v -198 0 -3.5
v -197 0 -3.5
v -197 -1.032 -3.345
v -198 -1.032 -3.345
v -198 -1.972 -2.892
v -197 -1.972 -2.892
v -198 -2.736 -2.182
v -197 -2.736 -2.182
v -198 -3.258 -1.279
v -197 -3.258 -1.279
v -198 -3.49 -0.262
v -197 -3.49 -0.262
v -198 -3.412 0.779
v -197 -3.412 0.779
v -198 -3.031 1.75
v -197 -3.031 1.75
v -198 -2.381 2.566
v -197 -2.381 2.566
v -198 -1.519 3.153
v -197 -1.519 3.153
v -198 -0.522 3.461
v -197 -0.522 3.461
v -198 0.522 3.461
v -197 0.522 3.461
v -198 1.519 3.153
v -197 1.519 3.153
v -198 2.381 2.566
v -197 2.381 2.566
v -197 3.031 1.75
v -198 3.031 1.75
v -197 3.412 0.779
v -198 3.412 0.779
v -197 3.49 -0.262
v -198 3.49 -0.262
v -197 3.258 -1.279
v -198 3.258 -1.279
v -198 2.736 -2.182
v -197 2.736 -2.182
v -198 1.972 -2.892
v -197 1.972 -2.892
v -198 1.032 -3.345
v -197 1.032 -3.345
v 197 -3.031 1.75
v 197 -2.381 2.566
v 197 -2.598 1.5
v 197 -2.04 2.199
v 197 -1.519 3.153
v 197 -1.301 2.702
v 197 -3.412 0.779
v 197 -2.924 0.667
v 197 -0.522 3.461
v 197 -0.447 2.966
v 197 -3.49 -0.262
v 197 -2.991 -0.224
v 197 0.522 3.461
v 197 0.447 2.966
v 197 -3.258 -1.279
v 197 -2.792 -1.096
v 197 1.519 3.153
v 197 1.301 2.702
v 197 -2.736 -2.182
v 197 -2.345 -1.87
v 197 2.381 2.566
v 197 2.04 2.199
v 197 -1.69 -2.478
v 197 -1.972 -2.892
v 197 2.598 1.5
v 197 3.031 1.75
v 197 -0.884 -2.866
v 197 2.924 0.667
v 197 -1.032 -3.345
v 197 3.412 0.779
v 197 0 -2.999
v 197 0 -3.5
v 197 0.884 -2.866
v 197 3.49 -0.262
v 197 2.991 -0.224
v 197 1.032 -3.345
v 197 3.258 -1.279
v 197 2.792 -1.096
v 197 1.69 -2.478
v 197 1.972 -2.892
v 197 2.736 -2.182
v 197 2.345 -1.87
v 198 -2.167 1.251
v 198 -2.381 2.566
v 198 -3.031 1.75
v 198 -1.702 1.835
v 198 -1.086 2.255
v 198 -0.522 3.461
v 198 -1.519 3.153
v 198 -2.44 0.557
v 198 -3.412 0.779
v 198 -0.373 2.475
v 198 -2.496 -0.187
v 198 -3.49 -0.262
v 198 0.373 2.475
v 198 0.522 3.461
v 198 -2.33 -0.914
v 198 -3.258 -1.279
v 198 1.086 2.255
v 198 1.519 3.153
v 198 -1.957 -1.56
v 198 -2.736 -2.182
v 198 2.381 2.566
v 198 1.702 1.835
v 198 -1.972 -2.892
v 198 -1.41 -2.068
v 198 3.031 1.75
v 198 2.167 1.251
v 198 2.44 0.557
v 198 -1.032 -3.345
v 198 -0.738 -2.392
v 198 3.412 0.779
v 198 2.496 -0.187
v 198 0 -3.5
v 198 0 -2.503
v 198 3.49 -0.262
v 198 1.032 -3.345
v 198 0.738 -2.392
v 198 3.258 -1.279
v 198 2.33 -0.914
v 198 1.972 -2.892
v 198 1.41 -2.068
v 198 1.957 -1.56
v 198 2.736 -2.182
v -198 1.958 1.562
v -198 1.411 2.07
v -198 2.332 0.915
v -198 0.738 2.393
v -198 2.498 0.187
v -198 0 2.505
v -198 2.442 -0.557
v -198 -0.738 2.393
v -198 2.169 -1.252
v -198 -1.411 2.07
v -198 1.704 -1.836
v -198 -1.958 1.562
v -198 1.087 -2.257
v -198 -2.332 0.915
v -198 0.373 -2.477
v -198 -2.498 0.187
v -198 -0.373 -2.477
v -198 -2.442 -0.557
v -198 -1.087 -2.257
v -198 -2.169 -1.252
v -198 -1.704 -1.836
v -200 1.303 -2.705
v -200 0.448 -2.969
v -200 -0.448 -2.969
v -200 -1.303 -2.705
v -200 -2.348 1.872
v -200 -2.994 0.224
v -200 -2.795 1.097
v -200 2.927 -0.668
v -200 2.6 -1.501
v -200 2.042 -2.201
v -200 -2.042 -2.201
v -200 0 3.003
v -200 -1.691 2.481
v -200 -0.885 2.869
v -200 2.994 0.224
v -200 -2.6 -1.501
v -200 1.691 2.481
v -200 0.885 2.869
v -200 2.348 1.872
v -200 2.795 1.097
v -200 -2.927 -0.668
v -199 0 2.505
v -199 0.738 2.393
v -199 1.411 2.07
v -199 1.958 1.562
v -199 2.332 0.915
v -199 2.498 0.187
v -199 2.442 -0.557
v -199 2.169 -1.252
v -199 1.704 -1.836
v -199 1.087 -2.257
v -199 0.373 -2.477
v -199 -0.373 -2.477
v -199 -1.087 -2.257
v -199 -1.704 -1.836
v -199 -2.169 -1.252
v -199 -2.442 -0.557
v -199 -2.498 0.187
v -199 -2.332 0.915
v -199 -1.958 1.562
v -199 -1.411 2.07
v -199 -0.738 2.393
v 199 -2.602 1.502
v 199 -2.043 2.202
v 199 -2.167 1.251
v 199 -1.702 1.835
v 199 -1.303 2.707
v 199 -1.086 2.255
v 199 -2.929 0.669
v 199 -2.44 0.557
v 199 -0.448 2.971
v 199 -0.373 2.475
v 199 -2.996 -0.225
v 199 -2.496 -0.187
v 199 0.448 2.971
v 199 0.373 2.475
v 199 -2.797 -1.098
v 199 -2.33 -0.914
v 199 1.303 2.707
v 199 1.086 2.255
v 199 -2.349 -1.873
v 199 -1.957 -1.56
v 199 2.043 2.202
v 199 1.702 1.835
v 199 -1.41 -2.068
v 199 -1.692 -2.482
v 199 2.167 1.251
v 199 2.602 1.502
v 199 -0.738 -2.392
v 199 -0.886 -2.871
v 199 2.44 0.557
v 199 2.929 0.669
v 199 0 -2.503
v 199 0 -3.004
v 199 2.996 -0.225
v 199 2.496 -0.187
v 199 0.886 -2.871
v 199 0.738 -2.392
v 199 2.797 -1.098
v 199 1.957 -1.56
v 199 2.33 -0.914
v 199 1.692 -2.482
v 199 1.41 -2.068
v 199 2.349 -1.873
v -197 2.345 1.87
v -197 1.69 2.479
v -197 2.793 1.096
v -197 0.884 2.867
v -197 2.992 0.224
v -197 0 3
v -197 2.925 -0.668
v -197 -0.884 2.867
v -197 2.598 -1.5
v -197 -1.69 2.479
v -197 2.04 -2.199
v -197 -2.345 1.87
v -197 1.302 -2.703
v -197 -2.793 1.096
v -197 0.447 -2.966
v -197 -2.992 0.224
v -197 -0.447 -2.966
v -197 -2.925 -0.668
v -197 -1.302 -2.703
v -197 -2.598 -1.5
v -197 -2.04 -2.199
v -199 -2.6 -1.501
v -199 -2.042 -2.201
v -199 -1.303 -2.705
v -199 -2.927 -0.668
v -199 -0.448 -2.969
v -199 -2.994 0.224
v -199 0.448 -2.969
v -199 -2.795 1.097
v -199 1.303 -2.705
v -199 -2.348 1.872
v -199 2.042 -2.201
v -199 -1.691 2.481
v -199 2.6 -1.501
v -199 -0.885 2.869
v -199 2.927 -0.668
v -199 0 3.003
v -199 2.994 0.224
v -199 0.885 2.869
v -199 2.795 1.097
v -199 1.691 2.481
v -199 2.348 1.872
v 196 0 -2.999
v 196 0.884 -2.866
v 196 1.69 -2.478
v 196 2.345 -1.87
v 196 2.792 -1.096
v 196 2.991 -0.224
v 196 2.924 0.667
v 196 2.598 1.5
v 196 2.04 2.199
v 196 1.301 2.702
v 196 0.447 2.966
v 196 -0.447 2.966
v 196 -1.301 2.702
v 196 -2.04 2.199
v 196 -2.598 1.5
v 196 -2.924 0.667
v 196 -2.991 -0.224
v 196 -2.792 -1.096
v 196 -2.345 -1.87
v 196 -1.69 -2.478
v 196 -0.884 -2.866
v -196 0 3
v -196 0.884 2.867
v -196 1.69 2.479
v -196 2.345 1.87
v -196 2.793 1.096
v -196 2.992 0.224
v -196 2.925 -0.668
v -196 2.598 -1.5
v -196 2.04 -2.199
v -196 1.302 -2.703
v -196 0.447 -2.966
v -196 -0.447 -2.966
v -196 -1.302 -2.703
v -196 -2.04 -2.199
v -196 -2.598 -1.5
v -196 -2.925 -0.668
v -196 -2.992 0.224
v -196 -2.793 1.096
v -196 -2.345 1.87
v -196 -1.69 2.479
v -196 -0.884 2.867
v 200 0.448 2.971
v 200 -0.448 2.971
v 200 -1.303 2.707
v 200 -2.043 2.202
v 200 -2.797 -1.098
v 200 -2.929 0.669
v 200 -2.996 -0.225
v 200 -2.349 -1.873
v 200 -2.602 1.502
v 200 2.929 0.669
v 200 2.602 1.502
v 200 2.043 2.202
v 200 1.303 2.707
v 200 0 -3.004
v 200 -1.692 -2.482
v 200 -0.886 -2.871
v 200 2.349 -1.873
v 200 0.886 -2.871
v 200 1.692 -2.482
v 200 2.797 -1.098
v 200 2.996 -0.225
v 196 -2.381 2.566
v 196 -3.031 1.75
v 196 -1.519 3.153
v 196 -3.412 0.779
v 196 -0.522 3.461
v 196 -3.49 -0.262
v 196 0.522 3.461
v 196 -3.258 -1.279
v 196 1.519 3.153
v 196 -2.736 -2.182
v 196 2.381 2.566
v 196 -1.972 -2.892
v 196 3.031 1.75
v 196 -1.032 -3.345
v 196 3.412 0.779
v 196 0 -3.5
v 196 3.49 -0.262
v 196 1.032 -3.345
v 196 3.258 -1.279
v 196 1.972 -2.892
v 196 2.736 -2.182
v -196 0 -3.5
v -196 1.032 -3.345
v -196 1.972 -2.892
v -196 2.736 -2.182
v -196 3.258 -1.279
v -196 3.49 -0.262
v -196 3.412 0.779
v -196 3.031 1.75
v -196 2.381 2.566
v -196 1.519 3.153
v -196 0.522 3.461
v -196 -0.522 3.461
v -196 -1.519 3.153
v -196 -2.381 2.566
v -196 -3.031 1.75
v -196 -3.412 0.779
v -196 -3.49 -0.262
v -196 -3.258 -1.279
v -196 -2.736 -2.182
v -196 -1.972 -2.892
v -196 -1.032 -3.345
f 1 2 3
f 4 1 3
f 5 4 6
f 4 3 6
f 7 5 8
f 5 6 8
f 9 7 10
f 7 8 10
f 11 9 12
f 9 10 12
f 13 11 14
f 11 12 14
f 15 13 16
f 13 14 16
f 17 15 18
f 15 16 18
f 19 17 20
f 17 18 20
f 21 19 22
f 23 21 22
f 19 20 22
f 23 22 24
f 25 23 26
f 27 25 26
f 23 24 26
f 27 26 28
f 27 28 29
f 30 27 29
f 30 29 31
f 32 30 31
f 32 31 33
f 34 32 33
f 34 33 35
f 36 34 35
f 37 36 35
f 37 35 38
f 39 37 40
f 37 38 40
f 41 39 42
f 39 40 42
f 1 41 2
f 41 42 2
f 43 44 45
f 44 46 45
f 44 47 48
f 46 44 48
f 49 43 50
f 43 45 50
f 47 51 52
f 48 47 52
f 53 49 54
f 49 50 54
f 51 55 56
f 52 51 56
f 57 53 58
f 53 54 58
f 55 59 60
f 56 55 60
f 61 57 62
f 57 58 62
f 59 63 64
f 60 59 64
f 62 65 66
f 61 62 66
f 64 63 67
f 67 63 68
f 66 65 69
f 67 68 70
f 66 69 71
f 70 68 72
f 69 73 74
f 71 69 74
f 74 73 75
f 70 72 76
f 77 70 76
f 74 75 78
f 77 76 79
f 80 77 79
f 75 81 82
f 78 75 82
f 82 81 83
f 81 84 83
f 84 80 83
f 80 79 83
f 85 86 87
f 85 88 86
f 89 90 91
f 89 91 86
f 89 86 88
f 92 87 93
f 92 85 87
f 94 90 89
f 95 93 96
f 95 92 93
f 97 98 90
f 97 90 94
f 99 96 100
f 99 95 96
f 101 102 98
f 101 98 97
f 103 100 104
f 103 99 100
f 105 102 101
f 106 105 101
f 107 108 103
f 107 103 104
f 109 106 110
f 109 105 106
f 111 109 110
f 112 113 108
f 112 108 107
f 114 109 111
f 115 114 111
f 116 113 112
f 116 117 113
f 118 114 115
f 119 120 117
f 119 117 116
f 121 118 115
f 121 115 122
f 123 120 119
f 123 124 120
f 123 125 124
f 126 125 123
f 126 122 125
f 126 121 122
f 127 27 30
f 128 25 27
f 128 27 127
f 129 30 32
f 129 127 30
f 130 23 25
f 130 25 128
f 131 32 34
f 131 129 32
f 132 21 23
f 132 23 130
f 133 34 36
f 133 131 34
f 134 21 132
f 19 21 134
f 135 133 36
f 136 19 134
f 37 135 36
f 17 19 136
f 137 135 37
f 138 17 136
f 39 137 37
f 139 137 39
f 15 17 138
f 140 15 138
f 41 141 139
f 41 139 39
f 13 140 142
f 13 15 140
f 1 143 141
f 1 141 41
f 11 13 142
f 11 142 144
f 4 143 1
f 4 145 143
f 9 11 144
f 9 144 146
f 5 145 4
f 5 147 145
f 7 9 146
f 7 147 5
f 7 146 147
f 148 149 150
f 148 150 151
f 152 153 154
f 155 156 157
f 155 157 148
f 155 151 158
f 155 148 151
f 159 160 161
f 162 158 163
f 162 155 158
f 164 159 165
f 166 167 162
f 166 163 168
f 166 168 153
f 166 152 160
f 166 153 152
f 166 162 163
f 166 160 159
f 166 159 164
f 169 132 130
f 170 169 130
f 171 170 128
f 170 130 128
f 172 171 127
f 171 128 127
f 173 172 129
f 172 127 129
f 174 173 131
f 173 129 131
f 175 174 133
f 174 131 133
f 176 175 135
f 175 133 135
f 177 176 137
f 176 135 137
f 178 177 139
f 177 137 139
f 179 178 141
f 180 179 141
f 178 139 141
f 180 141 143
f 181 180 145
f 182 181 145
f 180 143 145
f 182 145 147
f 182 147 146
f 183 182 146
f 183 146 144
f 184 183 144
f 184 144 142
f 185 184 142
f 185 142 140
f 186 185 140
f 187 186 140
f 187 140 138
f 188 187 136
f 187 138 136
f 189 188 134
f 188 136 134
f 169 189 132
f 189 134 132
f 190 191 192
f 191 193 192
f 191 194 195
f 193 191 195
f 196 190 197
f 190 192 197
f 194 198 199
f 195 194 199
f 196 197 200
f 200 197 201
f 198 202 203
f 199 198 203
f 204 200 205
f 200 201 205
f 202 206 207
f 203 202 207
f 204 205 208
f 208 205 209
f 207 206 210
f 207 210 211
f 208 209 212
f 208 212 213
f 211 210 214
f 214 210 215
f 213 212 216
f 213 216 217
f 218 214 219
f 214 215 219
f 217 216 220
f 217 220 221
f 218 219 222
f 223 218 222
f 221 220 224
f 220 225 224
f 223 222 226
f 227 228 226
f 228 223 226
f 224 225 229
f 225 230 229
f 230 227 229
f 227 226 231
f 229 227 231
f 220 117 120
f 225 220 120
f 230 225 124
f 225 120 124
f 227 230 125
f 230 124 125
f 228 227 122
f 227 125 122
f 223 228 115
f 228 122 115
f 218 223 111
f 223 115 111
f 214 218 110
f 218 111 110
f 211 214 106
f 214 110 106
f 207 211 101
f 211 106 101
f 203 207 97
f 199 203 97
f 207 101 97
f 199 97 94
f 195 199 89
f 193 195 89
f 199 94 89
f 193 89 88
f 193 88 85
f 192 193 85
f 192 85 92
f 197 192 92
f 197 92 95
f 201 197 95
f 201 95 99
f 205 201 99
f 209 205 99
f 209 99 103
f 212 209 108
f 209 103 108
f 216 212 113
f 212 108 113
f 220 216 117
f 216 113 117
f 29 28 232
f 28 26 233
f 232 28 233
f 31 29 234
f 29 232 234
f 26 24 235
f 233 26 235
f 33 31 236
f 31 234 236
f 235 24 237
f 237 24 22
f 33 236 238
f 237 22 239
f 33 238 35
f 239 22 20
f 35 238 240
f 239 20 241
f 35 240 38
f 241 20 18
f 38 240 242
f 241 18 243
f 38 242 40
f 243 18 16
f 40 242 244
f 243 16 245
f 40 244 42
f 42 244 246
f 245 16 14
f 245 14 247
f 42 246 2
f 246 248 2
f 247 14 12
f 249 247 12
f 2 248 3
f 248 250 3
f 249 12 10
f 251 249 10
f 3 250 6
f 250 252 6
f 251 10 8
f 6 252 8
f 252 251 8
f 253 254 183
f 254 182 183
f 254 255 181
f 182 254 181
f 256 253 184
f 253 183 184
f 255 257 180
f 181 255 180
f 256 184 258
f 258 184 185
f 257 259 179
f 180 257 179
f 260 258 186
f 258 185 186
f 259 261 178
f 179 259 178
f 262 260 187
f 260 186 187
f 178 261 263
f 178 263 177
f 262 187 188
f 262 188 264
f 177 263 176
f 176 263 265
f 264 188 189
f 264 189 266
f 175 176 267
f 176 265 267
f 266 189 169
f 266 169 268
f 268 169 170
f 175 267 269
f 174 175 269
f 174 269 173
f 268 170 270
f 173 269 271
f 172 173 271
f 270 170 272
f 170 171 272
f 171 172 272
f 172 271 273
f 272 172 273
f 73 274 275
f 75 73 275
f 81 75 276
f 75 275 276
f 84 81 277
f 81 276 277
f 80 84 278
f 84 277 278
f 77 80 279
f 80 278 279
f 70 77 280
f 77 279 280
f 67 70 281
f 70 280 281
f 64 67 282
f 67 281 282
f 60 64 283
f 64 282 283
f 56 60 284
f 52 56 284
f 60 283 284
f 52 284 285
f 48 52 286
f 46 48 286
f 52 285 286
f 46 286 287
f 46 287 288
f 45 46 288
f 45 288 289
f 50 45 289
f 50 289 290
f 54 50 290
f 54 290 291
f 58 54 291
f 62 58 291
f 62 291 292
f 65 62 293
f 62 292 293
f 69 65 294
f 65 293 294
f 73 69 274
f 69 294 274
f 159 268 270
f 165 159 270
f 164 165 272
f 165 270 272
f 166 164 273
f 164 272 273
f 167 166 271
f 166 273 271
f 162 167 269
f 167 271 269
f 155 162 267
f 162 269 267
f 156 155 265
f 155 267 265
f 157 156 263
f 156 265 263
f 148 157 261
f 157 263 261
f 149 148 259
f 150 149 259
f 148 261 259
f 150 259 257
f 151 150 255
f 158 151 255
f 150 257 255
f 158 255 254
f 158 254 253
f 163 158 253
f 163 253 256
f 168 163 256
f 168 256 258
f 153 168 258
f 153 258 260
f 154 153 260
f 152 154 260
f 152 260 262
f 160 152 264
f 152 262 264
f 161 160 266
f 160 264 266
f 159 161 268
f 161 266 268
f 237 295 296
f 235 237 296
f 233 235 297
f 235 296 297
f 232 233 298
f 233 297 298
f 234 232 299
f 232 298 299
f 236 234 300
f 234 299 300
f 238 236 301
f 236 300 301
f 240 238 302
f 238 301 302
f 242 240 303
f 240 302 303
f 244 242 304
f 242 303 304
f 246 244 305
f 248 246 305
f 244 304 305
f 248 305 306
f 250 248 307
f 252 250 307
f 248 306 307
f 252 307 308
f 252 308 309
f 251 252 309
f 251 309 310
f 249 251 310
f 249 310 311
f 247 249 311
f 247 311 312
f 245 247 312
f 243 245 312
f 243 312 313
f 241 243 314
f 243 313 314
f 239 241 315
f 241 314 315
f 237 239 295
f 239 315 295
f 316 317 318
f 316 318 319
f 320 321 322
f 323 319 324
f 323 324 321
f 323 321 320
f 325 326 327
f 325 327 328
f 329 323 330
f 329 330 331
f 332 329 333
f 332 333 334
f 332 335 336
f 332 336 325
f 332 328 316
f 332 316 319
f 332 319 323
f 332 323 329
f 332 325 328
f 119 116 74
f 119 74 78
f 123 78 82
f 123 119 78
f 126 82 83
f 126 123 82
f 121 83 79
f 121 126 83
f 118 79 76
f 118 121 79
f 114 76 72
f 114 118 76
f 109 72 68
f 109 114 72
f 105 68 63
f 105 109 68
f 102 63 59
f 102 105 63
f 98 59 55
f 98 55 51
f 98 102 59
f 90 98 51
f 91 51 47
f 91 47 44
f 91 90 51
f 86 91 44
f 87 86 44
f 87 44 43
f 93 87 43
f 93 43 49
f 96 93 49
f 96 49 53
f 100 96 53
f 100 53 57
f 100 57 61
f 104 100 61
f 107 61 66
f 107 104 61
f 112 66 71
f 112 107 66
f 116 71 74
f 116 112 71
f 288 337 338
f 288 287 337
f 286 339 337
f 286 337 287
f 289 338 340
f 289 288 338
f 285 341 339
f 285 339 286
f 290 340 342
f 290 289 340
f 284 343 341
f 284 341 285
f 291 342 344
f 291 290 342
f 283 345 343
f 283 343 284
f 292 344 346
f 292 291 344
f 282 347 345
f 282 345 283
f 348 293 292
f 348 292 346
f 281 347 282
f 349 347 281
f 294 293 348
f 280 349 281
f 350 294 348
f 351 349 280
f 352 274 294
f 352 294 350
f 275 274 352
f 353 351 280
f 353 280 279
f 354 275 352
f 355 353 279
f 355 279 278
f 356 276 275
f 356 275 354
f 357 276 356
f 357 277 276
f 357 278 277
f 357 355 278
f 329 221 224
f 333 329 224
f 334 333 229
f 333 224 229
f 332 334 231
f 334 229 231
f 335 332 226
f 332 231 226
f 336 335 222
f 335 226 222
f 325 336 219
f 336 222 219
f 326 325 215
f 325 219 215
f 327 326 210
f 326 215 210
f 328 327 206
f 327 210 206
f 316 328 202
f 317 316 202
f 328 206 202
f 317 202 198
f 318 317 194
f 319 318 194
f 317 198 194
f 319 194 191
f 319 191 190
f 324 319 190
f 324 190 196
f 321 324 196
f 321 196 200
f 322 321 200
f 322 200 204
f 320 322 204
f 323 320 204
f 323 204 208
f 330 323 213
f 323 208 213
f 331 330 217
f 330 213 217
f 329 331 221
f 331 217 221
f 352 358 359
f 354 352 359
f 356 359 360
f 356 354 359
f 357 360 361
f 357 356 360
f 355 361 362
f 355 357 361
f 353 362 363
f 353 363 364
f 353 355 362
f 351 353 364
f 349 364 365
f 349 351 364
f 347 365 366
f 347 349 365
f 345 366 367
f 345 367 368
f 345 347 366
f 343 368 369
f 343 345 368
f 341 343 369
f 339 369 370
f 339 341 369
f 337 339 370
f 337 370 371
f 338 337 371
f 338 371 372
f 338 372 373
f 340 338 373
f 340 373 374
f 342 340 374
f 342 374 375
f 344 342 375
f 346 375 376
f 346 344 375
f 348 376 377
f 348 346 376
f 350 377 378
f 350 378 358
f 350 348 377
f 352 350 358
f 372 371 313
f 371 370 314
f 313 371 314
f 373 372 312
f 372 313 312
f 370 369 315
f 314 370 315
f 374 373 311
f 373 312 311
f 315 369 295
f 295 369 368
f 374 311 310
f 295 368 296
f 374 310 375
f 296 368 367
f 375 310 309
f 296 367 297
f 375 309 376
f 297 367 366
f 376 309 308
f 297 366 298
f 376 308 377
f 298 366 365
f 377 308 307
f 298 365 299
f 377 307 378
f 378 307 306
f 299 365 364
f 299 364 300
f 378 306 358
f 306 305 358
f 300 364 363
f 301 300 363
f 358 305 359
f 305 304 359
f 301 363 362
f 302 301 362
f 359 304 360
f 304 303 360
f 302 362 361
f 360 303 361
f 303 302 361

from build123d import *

# Parameters (mm, degrees)
SKETCH1_R            = 3.5
BOSS_EXTRUDE1_DEPTH  = 196
SKETCH6_R            = 2.999428485
BOSS_EXTRUDE4_DEPTH  = 1
BOSS_EXTRUDE5_START  = 1
SKETCH7_R            = 3.5
BOSS_EXTRUDE5_DEPTH  = 1
SKETCH8_R            = 2.50271342
BOSS_EXTRUDE6_DEPTH  = 1
SKETCH9_R            = 3.004216162
BOSS_EXTRUDE7_DEPTH  = 1
SKETCH10_R           = 2.999964983
BOSS_EXTRUDE8_DEPTH  = 1
SKETCH11_R           = 3.5
BOSS_EXTRUDE9_DEPTH  = 1
SKETCH12_R           = 2.504776308
BOSS_EXTRUDE10_DEPTH = 1
SKETCH13_R           = 3.002711456
BOSS_EXTRUDE11_DEPTH = 1


with BuildPart() as part:
    # Sketch1 → Boss-Extrude1 (new, symmetric)
    with BuildSketch(Plane(origin=(0, 0, 0), x_dir=(0, 0, -1), z_dir=(1, 0, 0))):
        Circle(SKETCH1_R)
    extrude(amount=BOSS_EXTRUDE1_DEPTH, both=True)

    # Sketch6 → Boss-Extrude4 (add)
    with BuildSketch(Plane(origin=(196, 0, 0), x_dir=(0, 0, -1), z_dir=(1, 0, 0))):
        Circle(SKETCH6_R)
    extrude(amount=BOSS_EXTRUDE4_DEPTH)

    # Sketch7 → Boss-Extrude5 (add)
    with BuildSketch(Plane(origin=(197, 0, 0), x_dir=(0, 0, -1), z_dir=(1, 0, 0)).offset(BOSS_EXTRUDE5_START)):
        Circle(SKETCH7_R)
    extrude(amount=-BOSS_EXTRUDE5_DEPTH)

    # Sketch8 → Boss-Extrude6 (add)
    with BuildSketch(Plane(origin=(198, 0, 0), x_dir=(0, 0, -1), z_dir=(1, 0, 0))):
        Circle(SKETCH8_R)
    extrude(amount=BOSS_EXTRUDE6_DEPTH)

    # Sketch9 → Boss-Extrude7 (add)
    with BuildSketch(Plane(origin=(199, 0, 0), x_dir=(0, 0, -1), z_dir=(1, 0, 0))):
        Circle(SKETCH9_R)
    extrude(amount=BOSS_EXTRUDE7_DEPTH)

    # Sketch10 → Boss-Extrude8 (add)
    with BuildSketch(Plane.ZY.offset(196)):
        Circle(SKETCH10_R)
    extrude(amount=BOSS_EXTRUDE8_DEPTH)

    # Sketch11 → Boss-Extrude9 (add)
    with BuildSketch(Plane.ZY.offset(197)):
        with Locations(Location((0, 0, 0), (0, 0, 180))):
            Circle(SKETCH11_R)
    extrude(amount=BOSS_EXTRUDE9_DEPTH)

    # Sketch12 → Boss-Extrude10 (add)
    with BuildSketch(Plane.ZY.offset(198)):
        Circle(SKETCH12_R)
    extrude(amount=BOSS_EXTRUDE10_DEPTH)

    # Sketch13 → Boss-Extrude11 (add)
    with BuildSketch(Plane.ZY.offset(199)):
        Circle(SKETCH13_R)
    extrude(amount=BOSS_EXTRUDE11_DEPTH)


solid = part.part
